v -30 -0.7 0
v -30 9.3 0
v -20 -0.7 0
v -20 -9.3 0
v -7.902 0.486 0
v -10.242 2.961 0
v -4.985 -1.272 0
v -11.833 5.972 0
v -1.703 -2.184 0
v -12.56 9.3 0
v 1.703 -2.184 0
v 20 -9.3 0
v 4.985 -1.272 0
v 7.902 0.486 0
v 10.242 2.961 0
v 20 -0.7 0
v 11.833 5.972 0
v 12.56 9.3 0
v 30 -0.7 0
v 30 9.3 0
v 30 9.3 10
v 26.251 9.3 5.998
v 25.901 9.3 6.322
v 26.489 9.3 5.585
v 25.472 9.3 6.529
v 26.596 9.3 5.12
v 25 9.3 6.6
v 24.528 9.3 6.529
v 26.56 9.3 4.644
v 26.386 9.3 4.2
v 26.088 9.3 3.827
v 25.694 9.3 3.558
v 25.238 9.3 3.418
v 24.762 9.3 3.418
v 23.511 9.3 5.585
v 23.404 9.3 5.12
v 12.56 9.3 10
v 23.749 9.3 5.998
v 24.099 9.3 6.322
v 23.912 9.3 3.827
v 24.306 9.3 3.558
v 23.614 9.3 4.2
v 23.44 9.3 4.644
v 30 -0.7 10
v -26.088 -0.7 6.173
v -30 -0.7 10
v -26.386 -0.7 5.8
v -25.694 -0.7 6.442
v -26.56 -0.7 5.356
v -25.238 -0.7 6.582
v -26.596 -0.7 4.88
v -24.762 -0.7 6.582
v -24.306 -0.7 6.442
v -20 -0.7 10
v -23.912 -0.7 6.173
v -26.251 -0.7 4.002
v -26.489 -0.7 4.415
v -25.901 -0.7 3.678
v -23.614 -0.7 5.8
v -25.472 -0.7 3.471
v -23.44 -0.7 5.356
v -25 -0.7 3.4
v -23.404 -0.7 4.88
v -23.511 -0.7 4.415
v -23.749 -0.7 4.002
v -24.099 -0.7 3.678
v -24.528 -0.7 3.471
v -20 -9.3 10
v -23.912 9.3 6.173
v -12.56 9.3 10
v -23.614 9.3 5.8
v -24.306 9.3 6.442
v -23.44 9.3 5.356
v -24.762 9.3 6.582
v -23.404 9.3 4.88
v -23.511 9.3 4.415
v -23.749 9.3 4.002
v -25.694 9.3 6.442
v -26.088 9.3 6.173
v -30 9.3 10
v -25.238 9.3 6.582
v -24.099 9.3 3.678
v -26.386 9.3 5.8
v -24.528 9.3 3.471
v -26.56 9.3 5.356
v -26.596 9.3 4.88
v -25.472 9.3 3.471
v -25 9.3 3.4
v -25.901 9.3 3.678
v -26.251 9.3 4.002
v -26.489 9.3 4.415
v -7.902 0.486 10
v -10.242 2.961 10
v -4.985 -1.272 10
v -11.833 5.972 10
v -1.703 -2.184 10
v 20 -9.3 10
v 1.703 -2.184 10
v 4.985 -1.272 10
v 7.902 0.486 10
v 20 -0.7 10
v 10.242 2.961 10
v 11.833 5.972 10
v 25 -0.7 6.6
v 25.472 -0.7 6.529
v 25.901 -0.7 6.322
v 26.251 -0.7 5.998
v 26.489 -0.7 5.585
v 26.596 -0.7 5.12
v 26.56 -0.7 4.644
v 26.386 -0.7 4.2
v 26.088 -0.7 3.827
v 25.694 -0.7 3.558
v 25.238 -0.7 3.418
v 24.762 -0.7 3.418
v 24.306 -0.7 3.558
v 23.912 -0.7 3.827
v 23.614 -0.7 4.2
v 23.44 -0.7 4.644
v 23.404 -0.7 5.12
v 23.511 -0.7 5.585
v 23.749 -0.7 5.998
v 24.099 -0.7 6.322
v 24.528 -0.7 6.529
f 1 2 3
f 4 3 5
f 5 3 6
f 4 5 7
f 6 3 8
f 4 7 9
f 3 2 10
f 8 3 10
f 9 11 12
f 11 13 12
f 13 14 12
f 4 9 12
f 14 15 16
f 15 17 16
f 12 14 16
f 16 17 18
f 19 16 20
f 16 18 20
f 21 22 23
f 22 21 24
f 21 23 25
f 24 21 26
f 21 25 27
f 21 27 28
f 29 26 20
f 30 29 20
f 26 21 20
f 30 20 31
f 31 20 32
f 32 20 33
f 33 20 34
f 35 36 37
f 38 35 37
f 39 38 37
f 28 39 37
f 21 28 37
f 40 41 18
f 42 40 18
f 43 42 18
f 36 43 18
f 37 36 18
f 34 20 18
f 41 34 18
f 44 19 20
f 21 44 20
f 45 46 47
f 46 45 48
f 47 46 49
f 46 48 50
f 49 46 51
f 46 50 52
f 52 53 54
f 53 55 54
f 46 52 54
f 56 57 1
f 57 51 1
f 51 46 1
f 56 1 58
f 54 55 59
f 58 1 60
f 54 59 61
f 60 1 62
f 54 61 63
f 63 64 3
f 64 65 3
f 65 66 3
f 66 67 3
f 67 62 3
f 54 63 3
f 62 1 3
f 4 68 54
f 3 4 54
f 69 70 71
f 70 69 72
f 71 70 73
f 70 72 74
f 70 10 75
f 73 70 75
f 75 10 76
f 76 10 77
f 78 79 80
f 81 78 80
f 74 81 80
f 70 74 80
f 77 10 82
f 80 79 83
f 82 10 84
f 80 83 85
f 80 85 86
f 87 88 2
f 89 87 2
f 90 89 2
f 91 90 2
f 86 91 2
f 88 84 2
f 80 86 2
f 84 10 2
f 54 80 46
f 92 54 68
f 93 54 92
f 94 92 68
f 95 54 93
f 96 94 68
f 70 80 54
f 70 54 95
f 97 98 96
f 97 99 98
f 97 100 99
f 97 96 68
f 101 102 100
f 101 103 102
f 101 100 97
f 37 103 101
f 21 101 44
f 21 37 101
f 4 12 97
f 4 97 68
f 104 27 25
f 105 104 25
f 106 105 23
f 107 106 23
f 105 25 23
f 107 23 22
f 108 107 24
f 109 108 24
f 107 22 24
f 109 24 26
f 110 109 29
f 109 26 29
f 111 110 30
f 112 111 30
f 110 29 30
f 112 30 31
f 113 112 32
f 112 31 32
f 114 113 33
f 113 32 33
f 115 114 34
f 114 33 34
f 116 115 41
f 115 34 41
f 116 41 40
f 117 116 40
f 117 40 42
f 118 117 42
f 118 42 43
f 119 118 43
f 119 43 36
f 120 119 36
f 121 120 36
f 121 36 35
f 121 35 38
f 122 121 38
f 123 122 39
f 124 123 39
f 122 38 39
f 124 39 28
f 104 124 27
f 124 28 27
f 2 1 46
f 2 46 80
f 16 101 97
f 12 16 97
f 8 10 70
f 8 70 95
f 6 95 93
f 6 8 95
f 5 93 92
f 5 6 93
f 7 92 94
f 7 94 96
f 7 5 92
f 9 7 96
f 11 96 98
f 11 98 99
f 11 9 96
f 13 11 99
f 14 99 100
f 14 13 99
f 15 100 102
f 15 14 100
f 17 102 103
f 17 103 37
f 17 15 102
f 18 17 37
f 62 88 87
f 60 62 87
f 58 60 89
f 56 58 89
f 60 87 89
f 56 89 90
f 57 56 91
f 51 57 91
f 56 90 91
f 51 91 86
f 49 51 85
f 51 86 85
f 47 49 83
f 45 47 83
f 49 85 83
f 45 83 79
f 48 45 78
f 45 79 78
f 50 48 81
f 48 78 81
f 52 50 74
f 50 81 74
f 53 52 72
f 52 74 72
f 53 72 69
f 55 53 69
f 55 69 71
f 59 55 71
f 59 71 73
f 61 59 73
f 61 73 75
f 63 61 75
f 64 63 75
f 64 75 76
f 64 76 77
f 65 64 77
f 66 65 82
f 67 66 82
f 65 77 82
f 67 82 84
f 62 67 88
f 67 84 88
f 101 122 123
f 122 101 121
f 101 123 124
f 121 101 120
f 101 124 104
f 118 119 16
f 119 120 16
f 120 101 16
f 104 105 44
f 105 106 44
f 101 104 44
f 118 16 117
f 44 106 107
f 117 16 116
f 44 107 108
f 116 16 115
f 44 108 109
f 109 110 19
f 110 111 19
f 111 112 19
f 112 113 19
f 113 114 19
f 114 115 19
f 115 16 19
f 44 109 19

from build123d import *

# Parameters (mm, degrees)
SKETCH_1_W          = 10
SKETCH_1_H          = 10
EXTRUDE_1_DEPTH     = 10
SKETCH_2_R          = 1.6
CUT_EXTRUDE_1_DEPTH = 10


with BuildPart() as part:
    # Эскиз1 → Бобышка-Вытянуть1 (new body)
    with BuildSketch(Plane.XY):
        with Locations((-25, 4.3)):
            Rectangle(SKETCH_1_W, SKETCH_1_H)
        with BuildLine():
            ThreePointArc((-12.560254774, 9.3), (0, -2.3), (12.560254774, 9.3))
            Line((12.560254774, 9.3), (20, 9.3))
            Line((20, 9.3), (20, -9.3))
            Line((20, -9.3), (-20, -9.3))
            Line((-20, -9.3), (-20, 9.3))
            Line((-20, 9.3), (-12.560254774, 9.3))
        make_face()
        with Locations((25, 4.3)):
            Rectangle(SKETCH_1_W, SKETCH_1_H)
    extrude(amount=EXTRUDE_1_DEPTH)

    # Эскиз2 → Вырез-Вытянуть1 (cut)
    with BuildSketch(Plane(origin=(0, 9.3, 0), x_dir=(1, 0, 0), z_dir=(0, 1, 0))):
        with Locations(Location((25, -5, 0), (0, 0, 270))):
            Circle(SKETCH_2_R)
        with Locations(Location((-25, -5, 0), (0, 0, 90))):
            Circle(SKETCH_2_R)
    extrude(amount=-CUT_EXTRUDE_1_DEPTH, mode=Mode.SUBTRACT)


solid = part.part
